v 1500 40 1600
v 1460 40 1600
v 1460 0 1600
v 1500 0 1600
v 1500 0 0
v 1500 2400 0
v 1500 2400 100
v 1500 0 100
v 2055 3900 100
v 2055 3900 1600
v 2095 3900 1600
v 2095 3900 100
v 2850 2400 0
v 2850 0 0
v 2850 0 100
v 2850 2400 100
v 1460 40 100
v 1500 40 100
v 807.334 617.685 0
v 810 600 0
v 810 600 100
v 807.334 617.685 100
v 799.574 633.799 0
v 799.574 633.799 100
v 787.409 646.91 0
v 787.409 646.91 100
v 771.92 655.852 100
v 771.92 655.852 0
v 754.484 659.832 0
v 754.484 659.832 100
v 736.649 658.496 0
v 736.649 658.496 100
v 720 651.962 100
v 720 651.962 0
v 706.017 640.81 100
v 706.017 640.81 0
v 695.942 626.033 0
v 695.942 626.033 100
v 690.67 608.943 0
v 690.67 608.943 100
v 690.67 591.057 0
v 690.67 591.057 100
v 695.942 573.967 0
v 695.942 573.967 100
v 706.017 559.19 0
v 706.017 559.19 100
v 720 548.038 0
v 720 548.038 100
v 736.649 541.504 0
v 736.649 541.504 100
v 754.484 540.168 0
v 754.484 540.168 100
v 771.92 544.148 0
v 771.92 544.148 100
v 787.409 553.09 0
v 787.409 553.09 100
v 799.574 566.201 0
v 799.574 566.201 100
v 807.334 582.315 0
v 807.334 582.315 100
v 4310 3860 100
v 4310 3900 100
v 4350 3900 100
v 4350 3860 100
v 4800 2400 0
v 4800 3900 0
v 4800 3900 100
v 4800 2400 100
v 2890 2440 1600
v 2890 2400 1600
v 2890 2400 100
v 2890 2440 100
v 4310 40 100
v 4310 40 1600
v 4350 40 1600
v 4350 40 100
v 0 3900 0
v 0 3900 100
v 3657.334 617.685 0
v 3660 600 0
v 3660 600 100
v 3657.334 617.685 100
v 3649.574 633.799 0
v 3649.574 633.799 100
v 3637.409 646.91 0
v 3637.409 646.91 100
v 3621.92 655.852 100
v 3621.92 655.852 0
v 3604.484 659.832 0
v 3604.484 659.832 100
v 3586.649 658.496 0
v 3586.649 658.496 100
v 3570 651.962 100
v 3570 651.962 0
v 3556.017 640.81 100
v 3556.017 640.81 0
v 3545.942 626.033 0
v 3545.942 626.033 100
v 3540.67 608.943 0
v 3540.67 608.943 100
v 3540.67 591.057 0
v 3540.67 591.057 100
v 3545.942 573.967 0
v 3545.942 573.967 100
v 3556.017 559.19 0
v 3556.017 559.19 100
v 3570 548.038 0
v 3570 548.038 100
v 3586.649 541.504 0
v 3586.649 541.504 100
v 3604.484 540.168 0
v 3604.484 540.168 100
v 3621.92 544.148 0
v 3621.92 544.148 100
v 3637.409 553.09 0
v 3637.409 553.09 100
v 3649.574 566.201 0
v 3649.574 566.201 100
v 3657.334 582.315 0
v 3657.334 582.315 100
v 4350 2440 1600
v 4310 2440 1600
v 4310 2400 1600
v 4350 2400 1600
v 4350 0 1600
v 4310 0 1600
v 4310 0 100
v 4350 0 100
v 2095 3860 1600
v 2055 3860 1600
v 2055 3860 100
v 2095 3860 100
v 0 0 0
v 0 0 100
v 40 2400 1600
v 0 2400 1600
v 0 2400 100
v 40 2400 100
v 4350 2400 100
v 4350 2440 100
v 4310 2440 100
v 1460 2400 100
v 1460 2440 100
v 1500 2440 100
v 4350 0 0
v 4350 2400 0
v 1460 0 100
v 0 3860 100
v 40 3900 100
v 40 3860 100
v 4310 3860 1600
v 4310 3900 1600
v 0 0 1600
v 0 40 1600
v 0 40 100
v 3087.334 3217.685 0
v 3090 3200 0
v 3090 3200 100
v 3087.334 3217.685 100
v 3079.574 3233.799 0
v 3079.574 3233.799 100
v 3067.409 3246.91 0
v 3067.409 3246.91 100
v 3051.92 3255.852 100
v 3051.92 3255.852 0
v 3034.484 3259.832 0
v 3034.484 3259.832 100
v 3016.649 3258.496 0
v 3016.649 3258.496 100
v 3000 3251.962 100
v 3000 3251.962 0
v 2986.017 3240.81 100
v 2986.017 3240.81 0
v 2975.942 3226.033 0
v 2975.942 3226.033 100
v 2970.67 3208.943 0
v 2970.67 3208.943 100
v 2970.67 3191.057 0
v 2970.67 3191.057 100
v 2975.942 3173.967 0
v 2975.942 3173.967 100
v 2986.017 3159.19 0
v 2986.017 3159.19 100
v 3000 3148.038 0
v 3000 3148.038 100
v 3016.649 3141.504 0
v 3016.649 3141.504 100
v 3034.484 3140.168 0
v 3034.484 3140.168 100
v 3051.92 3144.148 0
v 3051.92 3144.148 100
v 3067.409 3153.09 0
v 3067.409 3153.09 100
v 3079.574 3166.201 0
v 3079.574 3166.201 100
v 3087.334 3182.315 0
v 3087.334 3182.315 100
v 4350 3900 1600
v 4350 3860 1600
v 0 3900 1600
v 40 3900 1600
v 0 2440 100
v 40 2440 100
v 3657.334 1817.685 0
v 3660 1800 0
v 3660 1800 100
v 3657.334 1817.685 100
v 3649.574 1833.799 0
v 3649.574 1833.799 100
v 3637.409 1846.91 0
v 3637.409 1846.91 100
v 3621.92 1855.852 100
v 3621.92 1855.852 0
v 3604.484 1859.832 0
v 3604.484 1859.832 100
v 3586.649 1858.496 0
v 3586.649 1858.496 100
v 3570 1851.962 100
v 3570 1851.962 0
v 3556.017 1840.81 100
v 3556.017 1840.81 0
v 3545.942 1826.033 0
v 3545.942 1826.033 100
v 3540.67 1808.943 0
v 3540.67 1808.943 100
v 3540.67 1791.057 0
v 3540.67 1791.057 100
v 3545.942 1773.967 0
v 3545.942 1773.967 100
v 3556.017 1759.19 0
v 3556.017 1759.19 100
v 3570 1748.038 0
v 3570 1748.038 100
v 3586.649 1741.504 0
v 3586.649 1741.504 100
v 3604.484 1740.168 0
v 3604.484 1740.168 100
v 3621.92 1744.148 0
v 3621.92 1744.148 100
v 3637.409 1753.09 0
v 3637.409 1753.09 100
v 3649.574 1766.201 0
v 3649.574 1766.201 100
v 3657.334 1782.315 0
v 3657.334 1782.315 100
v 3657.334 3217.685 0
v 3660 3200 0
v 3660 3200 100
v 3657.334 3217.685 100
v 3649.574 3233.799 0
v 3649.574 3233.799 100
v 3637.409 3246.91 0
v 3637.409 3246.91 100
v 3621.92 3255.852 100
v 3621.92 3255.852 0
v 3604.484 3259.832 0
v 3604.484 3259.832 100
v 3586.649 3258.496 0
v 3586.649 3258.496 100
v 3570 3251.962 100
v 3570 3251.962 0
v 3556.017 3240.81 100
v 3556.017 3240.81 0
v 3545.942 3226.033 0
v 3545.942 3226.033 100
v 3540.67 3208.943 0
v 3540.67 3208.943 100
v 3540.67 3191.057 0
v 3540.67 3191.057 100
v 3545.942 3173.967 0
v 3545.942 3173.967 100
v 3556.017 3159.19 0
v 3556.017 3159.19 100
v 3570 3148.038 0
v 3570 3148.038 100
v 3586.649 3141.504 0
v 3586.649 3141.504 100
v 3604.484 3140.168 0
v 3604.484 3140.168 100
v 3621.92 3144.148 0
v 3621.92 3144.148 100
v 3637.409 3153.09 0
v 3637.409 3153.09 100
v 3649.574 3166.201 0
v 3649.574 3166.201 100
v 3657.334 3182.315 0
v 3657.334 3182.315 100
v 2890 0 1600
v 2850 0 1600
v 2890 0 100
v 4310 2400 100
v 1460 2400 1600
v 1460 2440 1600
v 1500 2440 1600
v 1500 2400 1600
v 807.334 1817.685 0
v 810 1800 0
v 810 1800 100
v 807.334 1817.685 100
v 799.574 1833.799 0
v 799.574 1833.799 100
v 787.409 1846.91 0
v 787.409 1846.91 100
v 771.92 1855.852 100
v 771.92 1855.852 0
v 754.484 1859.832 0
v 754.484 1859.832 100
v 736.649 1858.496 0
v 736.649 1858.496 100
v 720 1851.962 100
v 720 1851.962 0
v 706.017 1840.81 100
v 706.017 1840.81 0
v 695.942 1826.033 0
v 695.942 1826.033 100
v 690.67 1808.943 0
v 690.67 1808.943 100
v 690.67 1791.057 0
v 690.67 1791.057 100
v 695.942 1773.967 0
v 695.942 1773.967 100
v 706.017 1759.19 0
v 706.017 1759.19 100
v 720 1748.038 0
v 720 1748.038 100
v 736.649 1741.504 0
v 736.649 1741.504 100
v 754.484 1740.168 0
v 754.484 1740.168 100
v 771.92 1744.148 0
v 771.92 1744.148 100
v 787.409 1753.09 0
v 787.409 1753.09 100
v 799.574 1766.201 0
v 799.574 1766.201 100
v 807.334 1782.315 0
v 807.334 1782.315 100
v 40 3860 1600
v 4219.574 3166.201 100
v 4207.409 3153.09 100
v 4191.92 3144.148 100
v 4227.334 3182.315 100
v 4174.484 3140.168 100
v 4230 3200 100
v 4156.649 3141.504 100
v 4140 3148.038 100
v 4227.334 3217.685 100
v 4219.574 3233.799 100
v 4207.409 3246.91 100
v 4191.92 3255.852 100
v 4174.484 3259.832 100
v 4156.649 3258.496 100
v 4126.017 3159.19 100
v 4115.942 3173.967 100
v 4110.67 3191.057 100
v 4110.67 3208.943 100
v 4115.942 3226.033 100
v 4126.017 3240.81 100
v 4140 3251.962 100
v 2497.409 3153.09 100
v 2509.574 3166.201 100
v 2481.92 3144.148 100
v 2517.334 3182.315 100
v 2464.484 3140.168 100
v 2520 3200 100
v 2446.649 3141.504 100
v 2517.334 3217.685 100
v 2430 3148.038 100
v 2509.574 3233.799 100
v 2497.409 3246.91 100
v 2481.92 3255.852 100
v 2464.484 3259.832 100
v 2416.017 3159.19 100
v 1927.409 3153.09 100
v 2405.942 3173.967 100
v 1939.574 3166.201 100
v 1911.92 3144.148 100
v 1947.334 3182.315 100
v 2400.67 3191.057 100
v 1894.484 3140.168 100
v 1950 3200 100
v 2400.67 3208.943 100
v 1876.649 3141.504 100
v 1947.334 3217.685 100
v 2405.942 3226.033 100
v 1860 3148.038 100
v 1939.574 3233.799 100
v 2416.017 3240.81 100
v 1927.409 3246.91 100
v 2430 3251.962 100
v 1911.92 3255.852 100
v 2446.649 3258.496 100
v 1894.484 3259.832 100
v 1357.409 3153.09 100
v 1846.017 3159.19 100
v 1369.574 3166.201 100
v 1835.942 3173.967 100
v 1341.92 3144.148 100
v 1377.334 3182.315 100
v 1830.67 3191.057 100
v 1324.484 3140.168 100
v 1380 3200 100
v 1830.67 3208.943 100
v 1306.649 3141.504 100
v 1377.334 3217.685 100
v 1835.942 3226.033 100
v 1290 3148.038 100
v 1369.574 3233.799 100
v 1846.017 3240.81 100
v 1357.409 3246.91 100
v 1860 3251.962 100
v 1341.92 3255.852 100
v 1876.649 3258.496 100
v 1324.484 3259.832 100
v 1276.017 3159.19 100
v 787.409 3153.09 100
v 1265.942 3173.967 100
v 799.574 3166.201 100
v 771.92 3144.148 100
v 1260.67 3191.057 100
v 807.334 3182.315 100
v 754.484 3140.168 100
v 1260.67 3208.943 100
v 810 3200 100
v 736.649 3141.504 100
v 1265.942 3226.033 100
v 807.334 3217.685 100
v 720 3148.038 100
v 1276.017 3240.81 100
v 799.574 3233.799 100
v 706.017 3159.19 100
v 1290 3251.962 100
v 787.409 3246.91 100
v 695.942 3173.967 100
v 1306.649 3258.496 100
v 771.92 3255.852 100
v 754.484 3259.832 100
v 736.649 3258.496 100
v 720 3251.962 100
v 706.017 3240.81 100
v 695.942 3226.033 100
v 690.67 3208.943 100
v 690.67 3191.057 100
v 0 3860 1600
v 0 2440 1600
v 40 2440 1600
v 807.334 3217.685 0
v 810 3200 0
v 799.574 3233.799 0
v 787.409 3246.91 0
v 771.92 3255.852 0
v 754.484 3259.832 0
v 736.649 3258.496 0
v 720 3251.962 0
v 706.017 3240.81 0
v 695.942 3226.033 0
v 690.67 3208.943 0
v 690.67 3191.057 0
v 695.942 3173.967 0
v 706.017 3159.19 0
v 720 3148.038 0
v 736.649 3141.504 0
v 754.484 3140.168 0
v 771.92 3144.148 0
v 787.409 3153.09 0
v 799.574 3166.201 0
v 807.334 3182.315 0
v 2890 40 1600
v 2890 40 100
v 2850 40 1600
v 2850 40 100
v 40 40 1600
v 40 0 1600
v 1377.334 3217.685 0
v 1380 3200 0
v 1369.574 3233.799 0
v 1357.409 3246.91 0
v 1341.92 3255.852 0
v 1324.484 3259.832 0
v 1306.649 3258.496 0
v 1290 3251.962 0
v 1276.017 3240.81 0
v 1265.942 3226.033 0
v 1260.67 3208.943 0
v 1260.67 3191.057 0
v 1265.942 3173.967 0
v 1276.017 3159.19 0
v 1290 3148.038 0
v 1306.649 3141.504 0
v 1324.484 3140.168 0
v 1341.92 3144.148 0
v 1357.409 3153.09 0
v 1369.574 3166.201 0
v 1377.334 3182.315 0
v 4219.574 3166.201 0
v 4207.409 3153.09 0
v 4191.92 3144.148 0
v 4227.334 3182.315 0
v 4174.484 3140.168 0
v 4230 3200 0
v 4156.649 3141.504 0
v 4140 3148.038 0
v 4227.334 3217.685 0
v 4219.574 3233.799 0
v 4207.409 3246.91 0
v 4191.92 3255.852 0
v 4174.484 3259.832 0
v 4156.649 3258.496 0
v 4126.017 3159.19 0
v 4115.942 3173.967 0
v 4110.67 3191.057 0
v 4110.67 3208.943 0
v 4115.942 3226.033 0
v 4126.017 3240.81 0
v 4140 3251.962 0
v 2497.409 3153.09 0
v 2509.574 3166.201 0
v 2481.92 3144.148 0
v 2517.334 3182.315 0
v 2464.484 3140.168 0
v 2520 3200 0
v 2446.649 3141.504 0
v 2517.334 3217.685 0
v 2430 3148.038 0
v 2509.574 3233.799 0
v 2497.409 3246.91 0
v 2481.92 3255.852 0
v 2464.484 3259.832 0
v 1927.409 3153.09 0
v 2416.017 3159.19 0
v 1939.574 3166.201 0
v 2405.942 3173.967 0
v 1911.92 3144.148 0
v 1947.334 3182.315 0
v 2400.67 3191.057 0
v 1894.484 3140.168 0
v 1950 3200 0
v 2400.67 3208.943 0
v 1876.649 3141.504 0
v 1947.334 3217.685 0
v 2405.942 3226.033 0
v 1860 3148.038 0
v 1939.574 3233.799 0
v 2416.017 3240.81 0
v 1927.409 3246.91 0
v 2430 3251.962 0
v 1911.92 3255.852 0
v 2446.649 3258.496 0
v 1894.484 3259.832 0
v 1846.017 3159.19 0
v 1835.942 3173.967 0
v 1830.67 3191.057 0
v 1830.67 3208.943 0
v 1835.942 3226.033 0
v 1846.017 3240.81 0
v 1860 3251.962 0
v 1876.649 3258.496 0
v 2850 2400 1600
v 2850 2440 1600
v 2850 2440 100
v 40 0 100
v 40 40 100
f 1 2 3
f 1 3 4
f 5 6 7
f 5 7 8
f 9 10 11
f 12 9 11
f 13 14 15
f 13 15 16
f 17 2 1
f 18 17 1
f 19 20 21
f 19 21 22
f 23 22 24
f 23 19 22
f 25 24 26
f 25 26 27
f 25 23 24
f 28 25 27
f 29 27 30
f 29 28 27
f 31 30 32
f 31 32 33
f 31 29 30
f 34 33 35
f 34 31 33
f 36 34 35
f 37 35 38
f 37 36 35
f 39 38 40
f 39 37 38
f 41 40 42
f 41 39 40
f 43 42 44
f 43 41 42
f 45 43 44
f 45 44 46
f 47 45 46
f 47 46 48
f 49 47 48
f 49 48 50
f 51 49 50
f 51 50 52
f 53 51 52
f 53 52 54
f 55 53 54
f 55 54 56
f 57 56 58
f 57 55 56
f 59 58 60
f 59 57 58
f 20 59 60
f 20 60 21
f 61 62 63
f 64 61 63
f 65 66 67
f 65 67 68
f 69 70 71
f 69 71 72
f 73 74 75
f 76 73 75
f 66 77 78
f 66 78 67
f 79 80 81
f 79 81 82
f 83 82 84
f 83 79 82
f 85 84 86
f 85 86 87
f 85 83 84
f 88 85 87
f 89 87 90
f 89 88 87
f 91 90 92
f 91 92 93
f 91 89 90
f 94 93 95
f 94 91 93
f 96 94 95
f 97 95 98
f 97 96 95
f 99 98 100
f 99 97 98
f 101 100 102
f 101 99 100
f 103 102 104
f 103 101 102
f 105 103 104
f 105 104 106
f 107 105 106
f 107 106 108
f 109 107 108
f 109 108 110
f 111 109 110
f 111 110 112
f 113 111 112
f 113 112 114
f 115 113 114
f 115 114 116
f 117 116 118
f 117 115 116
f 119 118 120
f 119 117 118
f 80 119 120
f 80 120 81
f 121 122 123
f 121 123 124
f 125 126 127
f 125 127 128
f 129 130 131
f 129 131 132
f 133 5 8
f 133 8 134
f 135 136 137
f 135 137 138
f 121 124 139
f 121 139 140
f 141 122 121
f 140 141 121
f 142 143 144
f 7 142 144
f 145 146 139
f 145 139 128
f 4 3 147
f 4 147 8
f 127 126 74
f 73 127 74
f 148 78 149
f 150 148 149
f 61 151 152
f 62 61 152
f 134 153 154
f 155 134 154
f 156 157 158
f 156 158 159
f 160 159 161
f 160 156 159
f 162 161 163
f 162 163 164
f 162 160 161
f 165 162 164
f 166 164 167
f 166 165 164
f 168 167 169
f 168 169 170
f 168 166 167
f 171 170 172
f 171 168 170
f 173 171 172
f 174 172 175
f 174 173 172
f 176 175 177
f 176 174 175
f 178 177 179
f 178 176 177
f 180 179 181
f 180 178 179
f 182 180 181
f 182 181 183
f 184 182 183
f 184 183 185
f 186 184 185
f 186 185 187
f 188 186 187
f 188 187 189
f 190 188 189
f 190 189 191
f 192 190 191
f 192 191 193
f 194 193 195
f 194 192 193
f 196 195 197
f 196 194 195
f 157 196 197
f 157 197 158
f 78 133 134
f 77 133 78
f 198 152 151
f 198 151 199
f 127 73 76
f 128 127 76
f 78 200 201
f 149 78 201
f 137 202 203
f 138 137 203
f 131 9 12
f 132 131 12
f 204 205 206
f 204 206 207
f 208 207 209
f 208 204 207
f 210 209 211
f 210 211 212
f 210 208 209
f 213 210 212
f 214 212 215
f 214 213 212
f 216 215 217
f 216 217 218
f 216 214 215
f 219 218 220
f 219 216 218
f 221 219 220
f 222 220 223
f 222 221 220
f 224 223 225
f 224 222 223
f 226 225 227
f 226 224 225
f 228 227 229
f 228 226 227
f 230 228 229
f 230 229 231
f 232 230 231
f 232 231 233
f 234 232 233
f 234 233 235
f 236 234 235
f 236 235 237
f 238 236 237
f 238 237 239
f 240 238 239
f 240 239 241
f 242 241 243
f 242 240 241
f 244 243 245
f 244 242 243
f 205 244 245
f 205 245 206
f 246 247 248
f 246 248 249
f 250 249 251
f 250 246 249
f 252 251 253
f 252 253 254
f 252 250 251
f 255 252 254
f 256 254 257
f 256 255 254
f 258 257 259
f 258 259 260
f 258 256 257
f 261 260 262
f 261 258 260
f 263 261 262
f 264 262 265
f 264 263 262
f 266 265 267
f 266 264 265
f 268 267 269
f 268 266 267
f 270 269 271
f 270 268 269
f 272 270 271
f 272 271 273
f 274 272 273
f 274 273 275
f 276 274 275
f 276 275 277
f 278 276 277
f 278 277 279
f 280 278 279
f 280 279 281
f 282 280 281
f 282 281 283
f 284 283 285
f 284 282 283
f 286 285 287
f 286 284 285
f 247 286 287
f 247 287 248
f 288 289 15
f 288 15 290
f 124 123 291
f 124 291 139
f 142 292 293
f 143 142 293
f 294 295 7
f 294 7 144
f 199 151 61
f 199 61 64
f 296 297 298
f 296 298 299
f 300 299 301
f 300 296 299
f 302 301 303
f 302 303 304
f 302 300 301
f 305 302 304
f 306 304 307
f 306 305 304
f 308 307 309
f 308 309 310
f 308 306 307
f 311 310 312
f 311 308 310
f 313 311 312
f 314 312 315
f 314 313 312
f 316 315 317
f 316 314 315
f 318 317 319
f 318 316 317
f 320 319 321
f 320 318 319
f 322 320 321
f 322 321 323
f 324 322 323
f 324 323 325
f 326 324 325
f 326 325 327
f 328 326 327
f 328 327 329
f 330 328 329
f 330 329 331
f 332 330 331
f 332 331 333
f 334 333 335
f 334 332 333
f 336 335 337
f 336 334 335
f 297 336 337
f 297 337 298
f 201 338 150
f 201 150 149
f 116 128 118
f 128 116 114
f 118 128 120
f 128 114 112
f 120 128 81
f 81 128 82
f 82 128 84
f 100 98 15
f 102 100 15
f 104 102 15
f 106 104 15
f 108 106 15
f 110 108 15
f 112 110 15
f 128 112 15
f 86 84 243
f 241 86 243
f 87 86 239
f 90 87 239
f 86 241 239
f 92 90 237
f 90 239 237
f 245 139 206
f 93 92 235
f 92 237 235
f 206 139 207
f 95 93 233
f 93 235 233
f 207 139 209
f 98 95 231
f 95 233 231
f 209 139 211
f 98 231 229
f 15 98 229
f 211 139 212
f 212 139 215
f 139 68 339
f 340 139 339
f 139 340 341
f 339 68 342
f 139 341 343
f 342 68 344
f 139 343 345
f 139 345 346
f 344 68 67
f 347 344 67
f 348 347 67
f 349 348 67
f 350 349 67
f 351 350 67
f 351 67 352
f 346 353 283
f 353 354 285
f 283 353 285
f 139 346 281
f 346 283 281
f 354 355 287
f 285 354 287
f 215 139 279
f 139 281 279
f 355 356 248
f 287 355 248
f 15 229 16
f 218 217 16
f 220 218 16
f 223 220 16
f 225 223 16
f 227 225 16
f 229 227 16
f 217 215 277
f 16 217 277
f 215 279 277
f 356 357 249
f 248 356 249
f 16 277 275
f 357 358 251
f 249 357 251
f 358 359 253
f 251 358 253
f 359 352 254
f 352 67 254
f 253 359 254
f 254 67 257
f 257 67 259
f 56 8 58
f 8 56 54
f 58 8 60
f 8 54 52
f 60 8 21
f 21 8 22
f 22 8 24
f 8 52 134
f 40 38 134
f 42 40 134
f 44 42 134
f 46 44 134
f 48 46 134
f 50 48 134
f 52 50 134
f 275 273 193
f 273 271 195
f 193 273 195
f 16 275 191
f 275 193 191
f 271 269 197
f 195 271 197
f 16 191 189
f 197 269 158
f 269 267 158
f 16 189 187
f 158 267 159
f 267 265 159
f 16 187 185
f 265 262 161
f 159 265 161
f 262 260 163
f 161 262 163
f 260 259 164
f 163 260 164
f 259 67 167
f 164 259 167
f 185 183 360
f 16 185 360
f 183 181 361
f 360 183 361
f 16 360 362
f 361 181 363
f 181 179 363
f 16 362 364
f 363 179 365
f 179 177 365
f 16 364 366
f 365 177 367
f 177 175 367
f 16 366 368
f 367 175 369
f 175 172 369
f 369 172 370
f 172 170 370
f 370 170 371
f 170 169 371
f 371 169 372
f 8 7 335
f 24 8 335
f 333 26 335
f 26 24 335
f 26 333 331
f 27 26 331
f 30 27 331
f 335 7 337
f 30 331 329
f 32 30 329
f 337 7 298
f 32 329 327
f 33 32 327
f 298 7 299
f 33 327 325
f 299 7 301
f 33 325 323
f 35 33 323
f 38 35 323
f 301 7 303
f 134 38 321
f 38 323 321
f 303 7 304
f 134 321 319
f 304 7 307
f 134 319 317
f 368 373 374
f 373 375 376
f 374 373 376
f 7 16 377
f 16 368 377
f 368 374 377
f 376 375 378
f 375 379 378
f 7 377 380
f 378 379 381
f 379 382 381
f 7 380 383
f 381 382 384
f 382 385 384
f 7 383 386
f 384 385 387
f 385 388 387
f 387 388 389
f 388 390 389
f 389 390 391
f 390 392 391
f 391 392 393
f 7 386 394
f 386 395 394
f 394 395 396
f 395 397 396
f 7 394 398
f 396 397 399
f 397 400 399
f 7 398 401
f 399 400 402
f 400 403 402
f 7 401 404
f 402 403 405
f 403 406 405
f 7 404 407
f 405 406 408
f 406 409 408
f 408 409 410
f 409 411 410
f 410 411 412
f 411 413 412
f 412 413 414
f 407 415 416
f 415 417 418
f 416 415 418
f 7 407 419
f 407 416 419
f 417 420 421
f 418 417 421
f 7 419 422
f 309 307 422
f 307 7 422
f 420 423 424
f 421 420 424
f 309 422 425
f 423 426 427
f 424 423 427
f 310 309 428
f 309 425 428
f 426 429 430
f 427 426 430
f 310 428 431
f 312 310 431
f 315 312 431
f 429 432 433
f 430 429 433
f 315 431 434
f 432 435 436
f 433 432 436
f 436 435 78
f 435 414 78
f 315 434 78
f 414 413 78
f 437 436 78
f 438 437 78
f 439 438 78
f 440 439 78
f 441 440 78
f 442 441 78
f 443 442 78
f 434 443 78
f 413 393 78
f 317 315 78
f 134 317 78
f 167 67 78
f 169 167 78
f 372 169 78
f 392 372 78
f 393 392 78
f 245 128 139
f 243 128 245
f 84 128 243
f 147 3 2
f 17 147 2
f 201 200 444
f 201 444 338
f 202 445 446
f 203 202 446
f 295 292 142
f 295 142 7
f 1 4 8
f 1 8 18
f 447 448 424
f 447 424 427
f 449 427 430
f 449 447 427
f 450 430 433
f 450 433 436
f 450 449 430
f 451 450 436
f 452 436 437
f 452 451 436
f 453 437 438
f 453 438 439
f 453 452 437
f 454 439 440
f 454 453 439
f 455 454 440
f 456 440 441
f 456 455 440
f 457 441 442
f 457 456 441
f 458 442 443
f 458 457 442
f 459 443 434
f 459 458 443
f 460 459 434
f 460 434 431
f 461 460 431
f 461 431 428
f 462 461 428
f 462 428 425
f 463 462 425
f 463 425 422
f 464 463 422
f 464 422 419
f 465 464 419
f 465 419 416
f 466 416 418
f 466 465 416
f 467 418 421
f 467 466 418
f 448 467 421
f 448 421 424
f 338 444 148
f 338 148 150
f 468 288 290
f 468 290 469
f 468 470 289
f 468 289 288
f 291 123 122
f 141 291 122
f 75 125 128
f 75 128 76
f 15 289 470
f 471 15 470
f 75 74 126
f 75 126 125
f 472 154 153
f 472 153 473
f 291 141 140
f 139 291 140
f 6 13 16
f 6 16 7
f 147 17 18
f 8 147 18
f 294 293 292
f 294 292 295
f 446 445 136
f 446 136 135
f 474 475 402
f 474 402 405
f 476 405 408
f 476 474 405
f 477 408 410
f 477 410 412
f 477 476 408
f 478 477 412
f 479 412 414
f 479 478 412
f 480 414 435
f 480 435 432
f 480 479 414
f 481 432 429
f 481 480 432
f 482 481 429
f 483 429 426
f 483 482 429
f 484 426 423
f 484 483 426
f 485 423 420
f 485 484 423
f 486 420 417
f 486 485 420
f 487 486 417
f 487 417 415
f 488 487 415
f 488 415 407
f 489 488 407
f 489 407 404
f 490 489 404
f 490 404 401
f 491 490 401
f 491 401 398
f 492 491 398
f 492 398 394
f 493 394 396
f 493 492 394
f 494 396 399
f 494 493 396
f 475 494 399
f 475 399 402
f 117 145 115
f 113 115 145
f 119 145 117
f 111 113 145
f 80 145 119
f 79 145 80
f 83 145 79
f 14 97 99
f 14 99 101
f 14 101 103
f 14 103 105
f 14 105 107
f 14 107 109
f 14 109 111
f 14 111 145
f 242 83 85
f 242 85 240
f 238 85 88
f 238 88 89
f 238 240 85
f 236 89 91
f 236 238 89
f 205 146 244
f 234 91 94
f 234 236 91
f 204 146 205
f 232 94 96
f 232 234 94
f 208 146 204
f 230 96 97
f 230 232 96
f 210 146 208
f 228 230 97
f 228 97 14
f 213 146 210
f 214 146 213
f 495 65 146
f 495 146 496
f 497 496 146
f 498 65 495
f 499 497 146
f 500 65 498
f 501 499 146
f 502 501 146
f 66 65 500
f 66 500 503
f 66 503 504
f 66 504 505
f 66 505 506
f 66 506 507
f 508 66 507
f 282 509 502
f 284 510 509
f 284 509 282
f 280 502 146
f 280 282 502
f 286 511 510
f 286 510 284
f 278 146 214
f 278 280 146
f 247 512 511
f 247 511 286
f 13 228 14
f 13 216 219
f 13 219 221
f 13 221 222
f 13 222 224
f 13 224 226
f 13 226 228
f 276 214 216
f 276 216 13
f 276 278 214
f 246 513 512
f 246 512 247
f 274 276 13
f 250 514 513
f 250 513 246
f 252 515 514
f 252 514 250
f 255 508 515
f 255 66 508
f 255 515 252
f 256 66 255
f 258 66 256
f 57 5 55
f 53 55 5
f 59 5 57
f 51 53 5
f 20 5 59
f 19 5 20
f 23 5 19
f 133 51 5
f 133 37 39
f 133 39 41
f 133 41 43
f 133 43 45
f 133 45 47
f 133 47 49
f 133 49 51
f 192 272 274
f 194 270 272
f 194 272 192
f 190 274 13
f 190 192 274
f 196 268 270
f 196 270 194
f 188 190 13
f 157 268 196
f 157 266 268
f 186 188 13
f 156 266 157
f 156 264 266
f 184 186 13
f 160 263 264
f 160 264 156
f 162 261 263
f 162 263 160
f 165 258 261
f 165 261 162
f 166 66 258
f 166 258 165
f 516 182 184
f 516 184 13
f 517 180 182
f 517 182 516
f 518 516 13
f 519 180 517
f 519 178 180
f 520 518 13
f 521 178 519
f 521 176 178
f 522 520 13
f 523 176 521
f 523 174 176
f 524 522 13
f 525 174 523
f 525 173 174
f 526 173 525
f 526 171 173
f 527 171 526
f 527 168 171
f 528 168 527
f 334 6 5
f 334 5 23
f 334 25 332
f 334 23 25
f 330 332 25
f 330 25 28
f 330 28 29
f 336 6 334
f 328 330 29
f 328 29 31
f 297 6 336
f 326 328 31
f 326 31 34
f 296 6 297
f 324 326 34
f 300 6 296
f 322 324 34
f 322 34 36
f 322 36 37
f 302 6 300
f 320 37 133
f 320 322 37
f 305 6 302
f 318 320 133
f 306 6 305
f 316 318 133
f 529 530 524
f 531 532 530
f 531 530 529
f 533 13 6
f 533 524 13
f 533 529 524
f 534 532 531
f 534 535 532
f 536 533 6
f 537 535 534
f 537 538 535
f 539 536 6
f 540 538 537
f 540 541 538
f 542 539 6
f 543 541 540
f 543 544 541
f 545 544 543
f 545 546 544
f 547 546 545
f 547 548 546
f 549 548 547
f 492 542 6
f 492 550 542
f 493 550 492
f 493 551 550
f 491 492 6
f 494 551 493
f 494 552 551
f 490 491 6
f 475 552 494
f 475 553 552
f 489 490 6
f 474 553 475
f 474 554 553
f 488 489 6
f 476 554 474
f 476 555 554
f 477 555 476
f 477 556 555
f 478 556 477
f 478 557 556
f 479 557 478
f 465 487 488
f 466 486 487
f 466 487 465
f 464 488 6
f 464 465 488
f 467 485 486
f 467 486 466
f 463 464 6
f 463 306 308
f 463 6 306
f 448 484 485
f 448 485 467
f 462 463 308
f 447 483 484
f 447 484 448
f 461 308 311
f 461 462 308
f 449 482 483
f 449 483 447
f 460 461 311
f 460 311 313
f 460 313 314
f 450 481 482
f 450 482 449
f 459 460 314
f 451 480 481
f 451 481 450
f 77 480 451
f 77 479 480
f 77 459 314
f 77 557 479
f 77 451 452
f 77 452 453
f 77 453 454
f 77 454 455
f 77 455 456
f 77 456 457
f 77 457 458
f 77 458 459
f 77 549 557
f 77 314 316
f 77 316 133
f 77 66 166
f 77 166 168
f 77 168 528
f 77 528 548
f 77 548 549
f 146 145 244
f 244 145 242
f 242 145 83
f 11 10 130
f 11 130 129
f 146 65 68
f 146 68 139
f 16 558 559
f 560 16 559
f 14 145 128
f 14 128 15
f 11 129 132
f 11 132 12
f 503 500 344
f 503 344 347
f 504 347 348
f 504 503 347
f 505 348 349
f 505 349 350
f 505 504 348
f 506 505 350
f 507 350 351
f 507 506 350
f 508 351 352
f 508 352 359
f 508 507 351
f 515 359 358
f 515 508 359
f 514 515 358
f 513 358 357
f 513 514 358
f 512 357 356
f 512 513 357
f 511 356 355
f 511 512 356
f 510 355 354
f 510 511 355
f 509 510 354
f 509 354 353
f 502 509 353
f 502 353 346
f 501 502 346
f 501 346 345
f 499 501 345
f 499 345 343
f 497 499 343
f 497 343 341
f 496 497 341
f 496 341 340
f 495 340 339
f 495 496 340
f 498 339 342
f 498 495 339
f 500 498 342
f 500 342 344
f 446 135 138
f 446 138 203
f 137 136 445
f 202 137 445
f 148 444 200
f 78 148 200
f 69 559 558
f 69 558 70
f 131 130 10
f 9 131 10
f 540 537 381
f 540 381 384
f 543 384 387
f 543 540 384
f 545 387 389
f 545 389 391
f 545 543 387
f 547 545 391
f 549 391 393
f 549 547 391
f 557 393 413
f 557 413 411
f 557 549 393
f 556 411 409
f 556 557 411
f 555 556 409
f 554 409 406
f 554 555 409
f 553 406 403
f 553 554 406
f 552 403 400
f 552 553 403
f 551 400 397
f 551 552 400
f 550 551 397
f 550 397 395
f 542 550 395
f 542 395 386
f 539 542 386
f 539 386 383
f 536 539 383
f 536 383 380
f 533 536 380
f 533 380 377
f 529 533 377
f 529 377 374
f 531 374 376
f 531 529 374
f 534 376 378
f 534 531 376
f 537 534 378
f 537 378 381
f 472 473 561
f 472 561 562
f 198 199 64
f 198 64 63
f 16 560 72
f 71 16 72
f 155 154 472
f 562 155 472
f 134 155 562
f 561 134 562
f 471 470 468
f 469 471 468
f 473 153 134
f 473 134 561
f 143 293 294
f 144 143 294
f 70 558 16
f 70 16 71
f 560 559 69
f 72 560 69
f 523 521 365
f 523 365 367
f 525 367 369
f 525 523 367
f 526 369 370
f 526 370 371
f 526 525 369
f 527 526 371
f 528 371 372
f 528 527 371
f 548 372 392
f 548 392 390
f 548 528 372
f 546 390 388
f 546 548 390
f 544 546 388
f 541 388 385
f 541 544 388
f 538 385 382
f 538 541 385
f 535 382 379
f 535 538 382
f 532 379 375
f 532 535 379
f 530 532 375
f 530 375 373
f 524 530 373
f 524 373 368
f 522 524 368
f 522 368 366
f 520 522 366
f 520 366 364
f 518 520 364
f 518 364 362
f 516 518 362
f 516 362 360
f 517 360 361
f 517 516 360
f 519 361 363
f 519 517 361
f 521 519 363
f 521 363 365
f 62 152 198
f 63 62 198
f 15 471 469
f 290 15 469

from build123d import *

# Parameters (mm, degrees)
SKETCH1_R              = 60
BOSS_EXTRUDE1_DEPTH    = 100
SKETCH2_W              = 40
SKETCH2_H              = 40
BOSS_EXTRUDE2_DEPTH    = 1500
BOSS_EXTRUDE2_2_DEPTH  = 1500
BOSS_EXTRUDE2_3_DEPTH  = 1500
BOSS_EXTRUDE2_4_DEPTH  = 1500
BOSS_EXTRUDE2_5_DEPTH  = 1500
BOSS_EXTRUDE2_6_DEPTH  = 1500
BOSS_EXTRUDE2_7_DEPTH  = 1500
BOSS_EXTRUDE2_8_DEPTH  = 1500
BOSS_EXTRUDE2_9_DEPTH  = 1500
BOSS_EXTRUDE2_10_DEPTH = 1500
BOSS_EXTRUDE2_11_DEPTH = 1500


with BuildPart() as part:
    # Sketch1 → Boss-Extrude1 (new body)
    with BuildSketch(Plane.XY):
        Polygon((0, 0), (0, 3900), (4800, 3900), (4800, 2400), (4350, 2400), (4350, 0), (2850, 0), (2850, 2400), (1500, 2400), (1500, 0), align=None)
        with Locations((750, 3200)):
            Circle(SKETCH1_R, mode=Mode.SUBTRACT)
        with Locations((1320, 3200)):
            Circle(SKETCH1_R, mode=Mode.SUBTRACT)
        with Locations((1890, 3200)):
            Circle(SKETCH1_R, mode=Mode.SUBTRACT)
        with Locations((2460, 3200)):
            Circle(SKETCH1_R, mode=Mode.SUBTRACT)
        with Locations((3030, 3200)):
            Circle(SKETCH1_R, mode=Mode.SUBTRACT)
        with Locations((3600, 3200)):
            Circle(SKETCH1_R, mode=Mode.SUBTRACT)
        with Locations((4170, 3200)):
            Circle(SKETCH1_R, mode=Mode.SUBTRACT)
        with Locations((750, 1800)):
            Circle(SKETCH1_R, mode=Mode.SUBTRACT)
        with Locations((750, 600)):
            Circle(SKETCH1_R, mode=Mode.SUBTRACT)
        with Locations((3600, 600)):
            Circle(SKETCH1_R, mode=Mode.SUBTRACT)
        with Locations((3600, 1800)):
            Circle(SKETCH1_R, mode=Mode.SUBTRACT)
    extrude(amount=BOSS_EXTRUDE1_DEPTH)


with BuildPart() as body_2:
    # Sketch2 → Boss-Extrude2 (new body)
    with BuildSketch(Plane.XY.offset(100)):
        with Locations((2870, 2420)):
            Rectangle(SKETCH2_W, SKETCH2_H)
    extrude(amount=BOSS_EXTRUDE2_DEPTH)


with BuildPart() as body_3:
    # Sketch2 → Boss-Extrude2 2 (new body)
    with BuildSketch(Plane.XY.offset(100)):
        with Locations((20, 3880)):
            Rectangle(SKETCH2_W, SKETCH2_H)
    extrude(amount=BOSS_EXTRUDE2_2_DEPTH)


with BuildPart() as body_4:
    # Sketch2 → Boss-Extrude2 3 (new body)
    with BuildSketch(Plane.XY.offset(100)):
        with Locations((20, 20)):
            Rectangle(SKETCH2_W, SKETCH2_H)
    extrude(amount=BOSS_EXTRUDE2_3_DEPTH)


with BuildPart() as body_5:
    # Sketch2 → Boss-Extrude2 4 (new body)
    with BuildSketch(Plane.XY.offset(100)):
        with Locations((1480, 20)):
            Rectangle(SKETCH2_W, SKETCH2_H)
    extrude(amount=BOSS_EXTRUDE2_4_DEPTH)


with BuildPart() as body_6:
    # Sketch2 → Boss-Extrude2 5 (new body)
    with BuildSketch(Plane.XY.offset(100)):
        with Locations((1480, 2420)):
            Rectangle(SKETCH2_W, SKETCH2_H)
    extrude(amount=BOSS_EXTRUDE2_5_DEPTH)


with BuildPart() as body_7:
    # Sketch2 → Boss-Extrude2 6 (new body)
    with BuildSketch(Plane.XY.offset(100)):
        with Locations((4330, 20)):
            Rectangle(SKETCH2_W, SKETCH2_H)
    extrude(amount=BOSS_EXTRUDE2_6_DEPTH)


with BuildPart() as body_8:
    # Sketch2 → Boss-Extrude2 7 (new body)
    with BuildSketch(Plane.XY.offset(100)):
        with Locations((2870, 20)):
            Rectangle(SKETCH2_W, SKETCH2_H)
    extrude(amount=BOSS_EXTRUDE2_7_DEPTH)


with BuildPart() as body_9:
    # Sketch2 → Boss-Extrude2 8 (new body)
    with BuildSketch(Plane.XY.offset(100)):
        with Locations((4330, 2420)):
            Rectangle(SKETCH2_W, SKETCH2_H)
    extrude(amount=BOSS_EXTRUDE2_8_DEPTH)


with BuildPart() as body_10:
    # Sketch2 → Boss-Extrude2 9 (new body)
    with BuildSketch(Plane.XY.offset(100)):
        with Locations((4330, 3880)):
            Rectangle(SKETCH2_W, SKETCH2_H)
    extrude(amount=BOSS_EXTRUDE2_9_DEPTH)


with BuildPart() as body_11:
    # Sketch2 → Boss-Extrude2 10 (new body)
    with BuildSketch(Plane.XY.offset(100)):
        with Locations((2075, 3880)):
            Rectangle(SKETCH2_W, SKETCH2_H)
    extrude(amount=BOSS_EXTRUDE2_10_DEPTH)


with BuildPart() as body_12:
    # Sketch2 → Boss-Extrude2 11 (new body)
    with BuildSketch(Plane.XY.offset(100)):
        with Locations((20, 2420)):
            Rectangle(SKETCH2_W, SKETCH2_H)
    extrude(amount=BOSS_EXTRUDE2_11_DEPTH)


solid = Compound([part.part, body_2.part, body_3.part, body_4.part, body_5.part, body_6.part, body_7.part, body_8.part, body_9.part, body_10.part, body_11.part, body_12.part])
